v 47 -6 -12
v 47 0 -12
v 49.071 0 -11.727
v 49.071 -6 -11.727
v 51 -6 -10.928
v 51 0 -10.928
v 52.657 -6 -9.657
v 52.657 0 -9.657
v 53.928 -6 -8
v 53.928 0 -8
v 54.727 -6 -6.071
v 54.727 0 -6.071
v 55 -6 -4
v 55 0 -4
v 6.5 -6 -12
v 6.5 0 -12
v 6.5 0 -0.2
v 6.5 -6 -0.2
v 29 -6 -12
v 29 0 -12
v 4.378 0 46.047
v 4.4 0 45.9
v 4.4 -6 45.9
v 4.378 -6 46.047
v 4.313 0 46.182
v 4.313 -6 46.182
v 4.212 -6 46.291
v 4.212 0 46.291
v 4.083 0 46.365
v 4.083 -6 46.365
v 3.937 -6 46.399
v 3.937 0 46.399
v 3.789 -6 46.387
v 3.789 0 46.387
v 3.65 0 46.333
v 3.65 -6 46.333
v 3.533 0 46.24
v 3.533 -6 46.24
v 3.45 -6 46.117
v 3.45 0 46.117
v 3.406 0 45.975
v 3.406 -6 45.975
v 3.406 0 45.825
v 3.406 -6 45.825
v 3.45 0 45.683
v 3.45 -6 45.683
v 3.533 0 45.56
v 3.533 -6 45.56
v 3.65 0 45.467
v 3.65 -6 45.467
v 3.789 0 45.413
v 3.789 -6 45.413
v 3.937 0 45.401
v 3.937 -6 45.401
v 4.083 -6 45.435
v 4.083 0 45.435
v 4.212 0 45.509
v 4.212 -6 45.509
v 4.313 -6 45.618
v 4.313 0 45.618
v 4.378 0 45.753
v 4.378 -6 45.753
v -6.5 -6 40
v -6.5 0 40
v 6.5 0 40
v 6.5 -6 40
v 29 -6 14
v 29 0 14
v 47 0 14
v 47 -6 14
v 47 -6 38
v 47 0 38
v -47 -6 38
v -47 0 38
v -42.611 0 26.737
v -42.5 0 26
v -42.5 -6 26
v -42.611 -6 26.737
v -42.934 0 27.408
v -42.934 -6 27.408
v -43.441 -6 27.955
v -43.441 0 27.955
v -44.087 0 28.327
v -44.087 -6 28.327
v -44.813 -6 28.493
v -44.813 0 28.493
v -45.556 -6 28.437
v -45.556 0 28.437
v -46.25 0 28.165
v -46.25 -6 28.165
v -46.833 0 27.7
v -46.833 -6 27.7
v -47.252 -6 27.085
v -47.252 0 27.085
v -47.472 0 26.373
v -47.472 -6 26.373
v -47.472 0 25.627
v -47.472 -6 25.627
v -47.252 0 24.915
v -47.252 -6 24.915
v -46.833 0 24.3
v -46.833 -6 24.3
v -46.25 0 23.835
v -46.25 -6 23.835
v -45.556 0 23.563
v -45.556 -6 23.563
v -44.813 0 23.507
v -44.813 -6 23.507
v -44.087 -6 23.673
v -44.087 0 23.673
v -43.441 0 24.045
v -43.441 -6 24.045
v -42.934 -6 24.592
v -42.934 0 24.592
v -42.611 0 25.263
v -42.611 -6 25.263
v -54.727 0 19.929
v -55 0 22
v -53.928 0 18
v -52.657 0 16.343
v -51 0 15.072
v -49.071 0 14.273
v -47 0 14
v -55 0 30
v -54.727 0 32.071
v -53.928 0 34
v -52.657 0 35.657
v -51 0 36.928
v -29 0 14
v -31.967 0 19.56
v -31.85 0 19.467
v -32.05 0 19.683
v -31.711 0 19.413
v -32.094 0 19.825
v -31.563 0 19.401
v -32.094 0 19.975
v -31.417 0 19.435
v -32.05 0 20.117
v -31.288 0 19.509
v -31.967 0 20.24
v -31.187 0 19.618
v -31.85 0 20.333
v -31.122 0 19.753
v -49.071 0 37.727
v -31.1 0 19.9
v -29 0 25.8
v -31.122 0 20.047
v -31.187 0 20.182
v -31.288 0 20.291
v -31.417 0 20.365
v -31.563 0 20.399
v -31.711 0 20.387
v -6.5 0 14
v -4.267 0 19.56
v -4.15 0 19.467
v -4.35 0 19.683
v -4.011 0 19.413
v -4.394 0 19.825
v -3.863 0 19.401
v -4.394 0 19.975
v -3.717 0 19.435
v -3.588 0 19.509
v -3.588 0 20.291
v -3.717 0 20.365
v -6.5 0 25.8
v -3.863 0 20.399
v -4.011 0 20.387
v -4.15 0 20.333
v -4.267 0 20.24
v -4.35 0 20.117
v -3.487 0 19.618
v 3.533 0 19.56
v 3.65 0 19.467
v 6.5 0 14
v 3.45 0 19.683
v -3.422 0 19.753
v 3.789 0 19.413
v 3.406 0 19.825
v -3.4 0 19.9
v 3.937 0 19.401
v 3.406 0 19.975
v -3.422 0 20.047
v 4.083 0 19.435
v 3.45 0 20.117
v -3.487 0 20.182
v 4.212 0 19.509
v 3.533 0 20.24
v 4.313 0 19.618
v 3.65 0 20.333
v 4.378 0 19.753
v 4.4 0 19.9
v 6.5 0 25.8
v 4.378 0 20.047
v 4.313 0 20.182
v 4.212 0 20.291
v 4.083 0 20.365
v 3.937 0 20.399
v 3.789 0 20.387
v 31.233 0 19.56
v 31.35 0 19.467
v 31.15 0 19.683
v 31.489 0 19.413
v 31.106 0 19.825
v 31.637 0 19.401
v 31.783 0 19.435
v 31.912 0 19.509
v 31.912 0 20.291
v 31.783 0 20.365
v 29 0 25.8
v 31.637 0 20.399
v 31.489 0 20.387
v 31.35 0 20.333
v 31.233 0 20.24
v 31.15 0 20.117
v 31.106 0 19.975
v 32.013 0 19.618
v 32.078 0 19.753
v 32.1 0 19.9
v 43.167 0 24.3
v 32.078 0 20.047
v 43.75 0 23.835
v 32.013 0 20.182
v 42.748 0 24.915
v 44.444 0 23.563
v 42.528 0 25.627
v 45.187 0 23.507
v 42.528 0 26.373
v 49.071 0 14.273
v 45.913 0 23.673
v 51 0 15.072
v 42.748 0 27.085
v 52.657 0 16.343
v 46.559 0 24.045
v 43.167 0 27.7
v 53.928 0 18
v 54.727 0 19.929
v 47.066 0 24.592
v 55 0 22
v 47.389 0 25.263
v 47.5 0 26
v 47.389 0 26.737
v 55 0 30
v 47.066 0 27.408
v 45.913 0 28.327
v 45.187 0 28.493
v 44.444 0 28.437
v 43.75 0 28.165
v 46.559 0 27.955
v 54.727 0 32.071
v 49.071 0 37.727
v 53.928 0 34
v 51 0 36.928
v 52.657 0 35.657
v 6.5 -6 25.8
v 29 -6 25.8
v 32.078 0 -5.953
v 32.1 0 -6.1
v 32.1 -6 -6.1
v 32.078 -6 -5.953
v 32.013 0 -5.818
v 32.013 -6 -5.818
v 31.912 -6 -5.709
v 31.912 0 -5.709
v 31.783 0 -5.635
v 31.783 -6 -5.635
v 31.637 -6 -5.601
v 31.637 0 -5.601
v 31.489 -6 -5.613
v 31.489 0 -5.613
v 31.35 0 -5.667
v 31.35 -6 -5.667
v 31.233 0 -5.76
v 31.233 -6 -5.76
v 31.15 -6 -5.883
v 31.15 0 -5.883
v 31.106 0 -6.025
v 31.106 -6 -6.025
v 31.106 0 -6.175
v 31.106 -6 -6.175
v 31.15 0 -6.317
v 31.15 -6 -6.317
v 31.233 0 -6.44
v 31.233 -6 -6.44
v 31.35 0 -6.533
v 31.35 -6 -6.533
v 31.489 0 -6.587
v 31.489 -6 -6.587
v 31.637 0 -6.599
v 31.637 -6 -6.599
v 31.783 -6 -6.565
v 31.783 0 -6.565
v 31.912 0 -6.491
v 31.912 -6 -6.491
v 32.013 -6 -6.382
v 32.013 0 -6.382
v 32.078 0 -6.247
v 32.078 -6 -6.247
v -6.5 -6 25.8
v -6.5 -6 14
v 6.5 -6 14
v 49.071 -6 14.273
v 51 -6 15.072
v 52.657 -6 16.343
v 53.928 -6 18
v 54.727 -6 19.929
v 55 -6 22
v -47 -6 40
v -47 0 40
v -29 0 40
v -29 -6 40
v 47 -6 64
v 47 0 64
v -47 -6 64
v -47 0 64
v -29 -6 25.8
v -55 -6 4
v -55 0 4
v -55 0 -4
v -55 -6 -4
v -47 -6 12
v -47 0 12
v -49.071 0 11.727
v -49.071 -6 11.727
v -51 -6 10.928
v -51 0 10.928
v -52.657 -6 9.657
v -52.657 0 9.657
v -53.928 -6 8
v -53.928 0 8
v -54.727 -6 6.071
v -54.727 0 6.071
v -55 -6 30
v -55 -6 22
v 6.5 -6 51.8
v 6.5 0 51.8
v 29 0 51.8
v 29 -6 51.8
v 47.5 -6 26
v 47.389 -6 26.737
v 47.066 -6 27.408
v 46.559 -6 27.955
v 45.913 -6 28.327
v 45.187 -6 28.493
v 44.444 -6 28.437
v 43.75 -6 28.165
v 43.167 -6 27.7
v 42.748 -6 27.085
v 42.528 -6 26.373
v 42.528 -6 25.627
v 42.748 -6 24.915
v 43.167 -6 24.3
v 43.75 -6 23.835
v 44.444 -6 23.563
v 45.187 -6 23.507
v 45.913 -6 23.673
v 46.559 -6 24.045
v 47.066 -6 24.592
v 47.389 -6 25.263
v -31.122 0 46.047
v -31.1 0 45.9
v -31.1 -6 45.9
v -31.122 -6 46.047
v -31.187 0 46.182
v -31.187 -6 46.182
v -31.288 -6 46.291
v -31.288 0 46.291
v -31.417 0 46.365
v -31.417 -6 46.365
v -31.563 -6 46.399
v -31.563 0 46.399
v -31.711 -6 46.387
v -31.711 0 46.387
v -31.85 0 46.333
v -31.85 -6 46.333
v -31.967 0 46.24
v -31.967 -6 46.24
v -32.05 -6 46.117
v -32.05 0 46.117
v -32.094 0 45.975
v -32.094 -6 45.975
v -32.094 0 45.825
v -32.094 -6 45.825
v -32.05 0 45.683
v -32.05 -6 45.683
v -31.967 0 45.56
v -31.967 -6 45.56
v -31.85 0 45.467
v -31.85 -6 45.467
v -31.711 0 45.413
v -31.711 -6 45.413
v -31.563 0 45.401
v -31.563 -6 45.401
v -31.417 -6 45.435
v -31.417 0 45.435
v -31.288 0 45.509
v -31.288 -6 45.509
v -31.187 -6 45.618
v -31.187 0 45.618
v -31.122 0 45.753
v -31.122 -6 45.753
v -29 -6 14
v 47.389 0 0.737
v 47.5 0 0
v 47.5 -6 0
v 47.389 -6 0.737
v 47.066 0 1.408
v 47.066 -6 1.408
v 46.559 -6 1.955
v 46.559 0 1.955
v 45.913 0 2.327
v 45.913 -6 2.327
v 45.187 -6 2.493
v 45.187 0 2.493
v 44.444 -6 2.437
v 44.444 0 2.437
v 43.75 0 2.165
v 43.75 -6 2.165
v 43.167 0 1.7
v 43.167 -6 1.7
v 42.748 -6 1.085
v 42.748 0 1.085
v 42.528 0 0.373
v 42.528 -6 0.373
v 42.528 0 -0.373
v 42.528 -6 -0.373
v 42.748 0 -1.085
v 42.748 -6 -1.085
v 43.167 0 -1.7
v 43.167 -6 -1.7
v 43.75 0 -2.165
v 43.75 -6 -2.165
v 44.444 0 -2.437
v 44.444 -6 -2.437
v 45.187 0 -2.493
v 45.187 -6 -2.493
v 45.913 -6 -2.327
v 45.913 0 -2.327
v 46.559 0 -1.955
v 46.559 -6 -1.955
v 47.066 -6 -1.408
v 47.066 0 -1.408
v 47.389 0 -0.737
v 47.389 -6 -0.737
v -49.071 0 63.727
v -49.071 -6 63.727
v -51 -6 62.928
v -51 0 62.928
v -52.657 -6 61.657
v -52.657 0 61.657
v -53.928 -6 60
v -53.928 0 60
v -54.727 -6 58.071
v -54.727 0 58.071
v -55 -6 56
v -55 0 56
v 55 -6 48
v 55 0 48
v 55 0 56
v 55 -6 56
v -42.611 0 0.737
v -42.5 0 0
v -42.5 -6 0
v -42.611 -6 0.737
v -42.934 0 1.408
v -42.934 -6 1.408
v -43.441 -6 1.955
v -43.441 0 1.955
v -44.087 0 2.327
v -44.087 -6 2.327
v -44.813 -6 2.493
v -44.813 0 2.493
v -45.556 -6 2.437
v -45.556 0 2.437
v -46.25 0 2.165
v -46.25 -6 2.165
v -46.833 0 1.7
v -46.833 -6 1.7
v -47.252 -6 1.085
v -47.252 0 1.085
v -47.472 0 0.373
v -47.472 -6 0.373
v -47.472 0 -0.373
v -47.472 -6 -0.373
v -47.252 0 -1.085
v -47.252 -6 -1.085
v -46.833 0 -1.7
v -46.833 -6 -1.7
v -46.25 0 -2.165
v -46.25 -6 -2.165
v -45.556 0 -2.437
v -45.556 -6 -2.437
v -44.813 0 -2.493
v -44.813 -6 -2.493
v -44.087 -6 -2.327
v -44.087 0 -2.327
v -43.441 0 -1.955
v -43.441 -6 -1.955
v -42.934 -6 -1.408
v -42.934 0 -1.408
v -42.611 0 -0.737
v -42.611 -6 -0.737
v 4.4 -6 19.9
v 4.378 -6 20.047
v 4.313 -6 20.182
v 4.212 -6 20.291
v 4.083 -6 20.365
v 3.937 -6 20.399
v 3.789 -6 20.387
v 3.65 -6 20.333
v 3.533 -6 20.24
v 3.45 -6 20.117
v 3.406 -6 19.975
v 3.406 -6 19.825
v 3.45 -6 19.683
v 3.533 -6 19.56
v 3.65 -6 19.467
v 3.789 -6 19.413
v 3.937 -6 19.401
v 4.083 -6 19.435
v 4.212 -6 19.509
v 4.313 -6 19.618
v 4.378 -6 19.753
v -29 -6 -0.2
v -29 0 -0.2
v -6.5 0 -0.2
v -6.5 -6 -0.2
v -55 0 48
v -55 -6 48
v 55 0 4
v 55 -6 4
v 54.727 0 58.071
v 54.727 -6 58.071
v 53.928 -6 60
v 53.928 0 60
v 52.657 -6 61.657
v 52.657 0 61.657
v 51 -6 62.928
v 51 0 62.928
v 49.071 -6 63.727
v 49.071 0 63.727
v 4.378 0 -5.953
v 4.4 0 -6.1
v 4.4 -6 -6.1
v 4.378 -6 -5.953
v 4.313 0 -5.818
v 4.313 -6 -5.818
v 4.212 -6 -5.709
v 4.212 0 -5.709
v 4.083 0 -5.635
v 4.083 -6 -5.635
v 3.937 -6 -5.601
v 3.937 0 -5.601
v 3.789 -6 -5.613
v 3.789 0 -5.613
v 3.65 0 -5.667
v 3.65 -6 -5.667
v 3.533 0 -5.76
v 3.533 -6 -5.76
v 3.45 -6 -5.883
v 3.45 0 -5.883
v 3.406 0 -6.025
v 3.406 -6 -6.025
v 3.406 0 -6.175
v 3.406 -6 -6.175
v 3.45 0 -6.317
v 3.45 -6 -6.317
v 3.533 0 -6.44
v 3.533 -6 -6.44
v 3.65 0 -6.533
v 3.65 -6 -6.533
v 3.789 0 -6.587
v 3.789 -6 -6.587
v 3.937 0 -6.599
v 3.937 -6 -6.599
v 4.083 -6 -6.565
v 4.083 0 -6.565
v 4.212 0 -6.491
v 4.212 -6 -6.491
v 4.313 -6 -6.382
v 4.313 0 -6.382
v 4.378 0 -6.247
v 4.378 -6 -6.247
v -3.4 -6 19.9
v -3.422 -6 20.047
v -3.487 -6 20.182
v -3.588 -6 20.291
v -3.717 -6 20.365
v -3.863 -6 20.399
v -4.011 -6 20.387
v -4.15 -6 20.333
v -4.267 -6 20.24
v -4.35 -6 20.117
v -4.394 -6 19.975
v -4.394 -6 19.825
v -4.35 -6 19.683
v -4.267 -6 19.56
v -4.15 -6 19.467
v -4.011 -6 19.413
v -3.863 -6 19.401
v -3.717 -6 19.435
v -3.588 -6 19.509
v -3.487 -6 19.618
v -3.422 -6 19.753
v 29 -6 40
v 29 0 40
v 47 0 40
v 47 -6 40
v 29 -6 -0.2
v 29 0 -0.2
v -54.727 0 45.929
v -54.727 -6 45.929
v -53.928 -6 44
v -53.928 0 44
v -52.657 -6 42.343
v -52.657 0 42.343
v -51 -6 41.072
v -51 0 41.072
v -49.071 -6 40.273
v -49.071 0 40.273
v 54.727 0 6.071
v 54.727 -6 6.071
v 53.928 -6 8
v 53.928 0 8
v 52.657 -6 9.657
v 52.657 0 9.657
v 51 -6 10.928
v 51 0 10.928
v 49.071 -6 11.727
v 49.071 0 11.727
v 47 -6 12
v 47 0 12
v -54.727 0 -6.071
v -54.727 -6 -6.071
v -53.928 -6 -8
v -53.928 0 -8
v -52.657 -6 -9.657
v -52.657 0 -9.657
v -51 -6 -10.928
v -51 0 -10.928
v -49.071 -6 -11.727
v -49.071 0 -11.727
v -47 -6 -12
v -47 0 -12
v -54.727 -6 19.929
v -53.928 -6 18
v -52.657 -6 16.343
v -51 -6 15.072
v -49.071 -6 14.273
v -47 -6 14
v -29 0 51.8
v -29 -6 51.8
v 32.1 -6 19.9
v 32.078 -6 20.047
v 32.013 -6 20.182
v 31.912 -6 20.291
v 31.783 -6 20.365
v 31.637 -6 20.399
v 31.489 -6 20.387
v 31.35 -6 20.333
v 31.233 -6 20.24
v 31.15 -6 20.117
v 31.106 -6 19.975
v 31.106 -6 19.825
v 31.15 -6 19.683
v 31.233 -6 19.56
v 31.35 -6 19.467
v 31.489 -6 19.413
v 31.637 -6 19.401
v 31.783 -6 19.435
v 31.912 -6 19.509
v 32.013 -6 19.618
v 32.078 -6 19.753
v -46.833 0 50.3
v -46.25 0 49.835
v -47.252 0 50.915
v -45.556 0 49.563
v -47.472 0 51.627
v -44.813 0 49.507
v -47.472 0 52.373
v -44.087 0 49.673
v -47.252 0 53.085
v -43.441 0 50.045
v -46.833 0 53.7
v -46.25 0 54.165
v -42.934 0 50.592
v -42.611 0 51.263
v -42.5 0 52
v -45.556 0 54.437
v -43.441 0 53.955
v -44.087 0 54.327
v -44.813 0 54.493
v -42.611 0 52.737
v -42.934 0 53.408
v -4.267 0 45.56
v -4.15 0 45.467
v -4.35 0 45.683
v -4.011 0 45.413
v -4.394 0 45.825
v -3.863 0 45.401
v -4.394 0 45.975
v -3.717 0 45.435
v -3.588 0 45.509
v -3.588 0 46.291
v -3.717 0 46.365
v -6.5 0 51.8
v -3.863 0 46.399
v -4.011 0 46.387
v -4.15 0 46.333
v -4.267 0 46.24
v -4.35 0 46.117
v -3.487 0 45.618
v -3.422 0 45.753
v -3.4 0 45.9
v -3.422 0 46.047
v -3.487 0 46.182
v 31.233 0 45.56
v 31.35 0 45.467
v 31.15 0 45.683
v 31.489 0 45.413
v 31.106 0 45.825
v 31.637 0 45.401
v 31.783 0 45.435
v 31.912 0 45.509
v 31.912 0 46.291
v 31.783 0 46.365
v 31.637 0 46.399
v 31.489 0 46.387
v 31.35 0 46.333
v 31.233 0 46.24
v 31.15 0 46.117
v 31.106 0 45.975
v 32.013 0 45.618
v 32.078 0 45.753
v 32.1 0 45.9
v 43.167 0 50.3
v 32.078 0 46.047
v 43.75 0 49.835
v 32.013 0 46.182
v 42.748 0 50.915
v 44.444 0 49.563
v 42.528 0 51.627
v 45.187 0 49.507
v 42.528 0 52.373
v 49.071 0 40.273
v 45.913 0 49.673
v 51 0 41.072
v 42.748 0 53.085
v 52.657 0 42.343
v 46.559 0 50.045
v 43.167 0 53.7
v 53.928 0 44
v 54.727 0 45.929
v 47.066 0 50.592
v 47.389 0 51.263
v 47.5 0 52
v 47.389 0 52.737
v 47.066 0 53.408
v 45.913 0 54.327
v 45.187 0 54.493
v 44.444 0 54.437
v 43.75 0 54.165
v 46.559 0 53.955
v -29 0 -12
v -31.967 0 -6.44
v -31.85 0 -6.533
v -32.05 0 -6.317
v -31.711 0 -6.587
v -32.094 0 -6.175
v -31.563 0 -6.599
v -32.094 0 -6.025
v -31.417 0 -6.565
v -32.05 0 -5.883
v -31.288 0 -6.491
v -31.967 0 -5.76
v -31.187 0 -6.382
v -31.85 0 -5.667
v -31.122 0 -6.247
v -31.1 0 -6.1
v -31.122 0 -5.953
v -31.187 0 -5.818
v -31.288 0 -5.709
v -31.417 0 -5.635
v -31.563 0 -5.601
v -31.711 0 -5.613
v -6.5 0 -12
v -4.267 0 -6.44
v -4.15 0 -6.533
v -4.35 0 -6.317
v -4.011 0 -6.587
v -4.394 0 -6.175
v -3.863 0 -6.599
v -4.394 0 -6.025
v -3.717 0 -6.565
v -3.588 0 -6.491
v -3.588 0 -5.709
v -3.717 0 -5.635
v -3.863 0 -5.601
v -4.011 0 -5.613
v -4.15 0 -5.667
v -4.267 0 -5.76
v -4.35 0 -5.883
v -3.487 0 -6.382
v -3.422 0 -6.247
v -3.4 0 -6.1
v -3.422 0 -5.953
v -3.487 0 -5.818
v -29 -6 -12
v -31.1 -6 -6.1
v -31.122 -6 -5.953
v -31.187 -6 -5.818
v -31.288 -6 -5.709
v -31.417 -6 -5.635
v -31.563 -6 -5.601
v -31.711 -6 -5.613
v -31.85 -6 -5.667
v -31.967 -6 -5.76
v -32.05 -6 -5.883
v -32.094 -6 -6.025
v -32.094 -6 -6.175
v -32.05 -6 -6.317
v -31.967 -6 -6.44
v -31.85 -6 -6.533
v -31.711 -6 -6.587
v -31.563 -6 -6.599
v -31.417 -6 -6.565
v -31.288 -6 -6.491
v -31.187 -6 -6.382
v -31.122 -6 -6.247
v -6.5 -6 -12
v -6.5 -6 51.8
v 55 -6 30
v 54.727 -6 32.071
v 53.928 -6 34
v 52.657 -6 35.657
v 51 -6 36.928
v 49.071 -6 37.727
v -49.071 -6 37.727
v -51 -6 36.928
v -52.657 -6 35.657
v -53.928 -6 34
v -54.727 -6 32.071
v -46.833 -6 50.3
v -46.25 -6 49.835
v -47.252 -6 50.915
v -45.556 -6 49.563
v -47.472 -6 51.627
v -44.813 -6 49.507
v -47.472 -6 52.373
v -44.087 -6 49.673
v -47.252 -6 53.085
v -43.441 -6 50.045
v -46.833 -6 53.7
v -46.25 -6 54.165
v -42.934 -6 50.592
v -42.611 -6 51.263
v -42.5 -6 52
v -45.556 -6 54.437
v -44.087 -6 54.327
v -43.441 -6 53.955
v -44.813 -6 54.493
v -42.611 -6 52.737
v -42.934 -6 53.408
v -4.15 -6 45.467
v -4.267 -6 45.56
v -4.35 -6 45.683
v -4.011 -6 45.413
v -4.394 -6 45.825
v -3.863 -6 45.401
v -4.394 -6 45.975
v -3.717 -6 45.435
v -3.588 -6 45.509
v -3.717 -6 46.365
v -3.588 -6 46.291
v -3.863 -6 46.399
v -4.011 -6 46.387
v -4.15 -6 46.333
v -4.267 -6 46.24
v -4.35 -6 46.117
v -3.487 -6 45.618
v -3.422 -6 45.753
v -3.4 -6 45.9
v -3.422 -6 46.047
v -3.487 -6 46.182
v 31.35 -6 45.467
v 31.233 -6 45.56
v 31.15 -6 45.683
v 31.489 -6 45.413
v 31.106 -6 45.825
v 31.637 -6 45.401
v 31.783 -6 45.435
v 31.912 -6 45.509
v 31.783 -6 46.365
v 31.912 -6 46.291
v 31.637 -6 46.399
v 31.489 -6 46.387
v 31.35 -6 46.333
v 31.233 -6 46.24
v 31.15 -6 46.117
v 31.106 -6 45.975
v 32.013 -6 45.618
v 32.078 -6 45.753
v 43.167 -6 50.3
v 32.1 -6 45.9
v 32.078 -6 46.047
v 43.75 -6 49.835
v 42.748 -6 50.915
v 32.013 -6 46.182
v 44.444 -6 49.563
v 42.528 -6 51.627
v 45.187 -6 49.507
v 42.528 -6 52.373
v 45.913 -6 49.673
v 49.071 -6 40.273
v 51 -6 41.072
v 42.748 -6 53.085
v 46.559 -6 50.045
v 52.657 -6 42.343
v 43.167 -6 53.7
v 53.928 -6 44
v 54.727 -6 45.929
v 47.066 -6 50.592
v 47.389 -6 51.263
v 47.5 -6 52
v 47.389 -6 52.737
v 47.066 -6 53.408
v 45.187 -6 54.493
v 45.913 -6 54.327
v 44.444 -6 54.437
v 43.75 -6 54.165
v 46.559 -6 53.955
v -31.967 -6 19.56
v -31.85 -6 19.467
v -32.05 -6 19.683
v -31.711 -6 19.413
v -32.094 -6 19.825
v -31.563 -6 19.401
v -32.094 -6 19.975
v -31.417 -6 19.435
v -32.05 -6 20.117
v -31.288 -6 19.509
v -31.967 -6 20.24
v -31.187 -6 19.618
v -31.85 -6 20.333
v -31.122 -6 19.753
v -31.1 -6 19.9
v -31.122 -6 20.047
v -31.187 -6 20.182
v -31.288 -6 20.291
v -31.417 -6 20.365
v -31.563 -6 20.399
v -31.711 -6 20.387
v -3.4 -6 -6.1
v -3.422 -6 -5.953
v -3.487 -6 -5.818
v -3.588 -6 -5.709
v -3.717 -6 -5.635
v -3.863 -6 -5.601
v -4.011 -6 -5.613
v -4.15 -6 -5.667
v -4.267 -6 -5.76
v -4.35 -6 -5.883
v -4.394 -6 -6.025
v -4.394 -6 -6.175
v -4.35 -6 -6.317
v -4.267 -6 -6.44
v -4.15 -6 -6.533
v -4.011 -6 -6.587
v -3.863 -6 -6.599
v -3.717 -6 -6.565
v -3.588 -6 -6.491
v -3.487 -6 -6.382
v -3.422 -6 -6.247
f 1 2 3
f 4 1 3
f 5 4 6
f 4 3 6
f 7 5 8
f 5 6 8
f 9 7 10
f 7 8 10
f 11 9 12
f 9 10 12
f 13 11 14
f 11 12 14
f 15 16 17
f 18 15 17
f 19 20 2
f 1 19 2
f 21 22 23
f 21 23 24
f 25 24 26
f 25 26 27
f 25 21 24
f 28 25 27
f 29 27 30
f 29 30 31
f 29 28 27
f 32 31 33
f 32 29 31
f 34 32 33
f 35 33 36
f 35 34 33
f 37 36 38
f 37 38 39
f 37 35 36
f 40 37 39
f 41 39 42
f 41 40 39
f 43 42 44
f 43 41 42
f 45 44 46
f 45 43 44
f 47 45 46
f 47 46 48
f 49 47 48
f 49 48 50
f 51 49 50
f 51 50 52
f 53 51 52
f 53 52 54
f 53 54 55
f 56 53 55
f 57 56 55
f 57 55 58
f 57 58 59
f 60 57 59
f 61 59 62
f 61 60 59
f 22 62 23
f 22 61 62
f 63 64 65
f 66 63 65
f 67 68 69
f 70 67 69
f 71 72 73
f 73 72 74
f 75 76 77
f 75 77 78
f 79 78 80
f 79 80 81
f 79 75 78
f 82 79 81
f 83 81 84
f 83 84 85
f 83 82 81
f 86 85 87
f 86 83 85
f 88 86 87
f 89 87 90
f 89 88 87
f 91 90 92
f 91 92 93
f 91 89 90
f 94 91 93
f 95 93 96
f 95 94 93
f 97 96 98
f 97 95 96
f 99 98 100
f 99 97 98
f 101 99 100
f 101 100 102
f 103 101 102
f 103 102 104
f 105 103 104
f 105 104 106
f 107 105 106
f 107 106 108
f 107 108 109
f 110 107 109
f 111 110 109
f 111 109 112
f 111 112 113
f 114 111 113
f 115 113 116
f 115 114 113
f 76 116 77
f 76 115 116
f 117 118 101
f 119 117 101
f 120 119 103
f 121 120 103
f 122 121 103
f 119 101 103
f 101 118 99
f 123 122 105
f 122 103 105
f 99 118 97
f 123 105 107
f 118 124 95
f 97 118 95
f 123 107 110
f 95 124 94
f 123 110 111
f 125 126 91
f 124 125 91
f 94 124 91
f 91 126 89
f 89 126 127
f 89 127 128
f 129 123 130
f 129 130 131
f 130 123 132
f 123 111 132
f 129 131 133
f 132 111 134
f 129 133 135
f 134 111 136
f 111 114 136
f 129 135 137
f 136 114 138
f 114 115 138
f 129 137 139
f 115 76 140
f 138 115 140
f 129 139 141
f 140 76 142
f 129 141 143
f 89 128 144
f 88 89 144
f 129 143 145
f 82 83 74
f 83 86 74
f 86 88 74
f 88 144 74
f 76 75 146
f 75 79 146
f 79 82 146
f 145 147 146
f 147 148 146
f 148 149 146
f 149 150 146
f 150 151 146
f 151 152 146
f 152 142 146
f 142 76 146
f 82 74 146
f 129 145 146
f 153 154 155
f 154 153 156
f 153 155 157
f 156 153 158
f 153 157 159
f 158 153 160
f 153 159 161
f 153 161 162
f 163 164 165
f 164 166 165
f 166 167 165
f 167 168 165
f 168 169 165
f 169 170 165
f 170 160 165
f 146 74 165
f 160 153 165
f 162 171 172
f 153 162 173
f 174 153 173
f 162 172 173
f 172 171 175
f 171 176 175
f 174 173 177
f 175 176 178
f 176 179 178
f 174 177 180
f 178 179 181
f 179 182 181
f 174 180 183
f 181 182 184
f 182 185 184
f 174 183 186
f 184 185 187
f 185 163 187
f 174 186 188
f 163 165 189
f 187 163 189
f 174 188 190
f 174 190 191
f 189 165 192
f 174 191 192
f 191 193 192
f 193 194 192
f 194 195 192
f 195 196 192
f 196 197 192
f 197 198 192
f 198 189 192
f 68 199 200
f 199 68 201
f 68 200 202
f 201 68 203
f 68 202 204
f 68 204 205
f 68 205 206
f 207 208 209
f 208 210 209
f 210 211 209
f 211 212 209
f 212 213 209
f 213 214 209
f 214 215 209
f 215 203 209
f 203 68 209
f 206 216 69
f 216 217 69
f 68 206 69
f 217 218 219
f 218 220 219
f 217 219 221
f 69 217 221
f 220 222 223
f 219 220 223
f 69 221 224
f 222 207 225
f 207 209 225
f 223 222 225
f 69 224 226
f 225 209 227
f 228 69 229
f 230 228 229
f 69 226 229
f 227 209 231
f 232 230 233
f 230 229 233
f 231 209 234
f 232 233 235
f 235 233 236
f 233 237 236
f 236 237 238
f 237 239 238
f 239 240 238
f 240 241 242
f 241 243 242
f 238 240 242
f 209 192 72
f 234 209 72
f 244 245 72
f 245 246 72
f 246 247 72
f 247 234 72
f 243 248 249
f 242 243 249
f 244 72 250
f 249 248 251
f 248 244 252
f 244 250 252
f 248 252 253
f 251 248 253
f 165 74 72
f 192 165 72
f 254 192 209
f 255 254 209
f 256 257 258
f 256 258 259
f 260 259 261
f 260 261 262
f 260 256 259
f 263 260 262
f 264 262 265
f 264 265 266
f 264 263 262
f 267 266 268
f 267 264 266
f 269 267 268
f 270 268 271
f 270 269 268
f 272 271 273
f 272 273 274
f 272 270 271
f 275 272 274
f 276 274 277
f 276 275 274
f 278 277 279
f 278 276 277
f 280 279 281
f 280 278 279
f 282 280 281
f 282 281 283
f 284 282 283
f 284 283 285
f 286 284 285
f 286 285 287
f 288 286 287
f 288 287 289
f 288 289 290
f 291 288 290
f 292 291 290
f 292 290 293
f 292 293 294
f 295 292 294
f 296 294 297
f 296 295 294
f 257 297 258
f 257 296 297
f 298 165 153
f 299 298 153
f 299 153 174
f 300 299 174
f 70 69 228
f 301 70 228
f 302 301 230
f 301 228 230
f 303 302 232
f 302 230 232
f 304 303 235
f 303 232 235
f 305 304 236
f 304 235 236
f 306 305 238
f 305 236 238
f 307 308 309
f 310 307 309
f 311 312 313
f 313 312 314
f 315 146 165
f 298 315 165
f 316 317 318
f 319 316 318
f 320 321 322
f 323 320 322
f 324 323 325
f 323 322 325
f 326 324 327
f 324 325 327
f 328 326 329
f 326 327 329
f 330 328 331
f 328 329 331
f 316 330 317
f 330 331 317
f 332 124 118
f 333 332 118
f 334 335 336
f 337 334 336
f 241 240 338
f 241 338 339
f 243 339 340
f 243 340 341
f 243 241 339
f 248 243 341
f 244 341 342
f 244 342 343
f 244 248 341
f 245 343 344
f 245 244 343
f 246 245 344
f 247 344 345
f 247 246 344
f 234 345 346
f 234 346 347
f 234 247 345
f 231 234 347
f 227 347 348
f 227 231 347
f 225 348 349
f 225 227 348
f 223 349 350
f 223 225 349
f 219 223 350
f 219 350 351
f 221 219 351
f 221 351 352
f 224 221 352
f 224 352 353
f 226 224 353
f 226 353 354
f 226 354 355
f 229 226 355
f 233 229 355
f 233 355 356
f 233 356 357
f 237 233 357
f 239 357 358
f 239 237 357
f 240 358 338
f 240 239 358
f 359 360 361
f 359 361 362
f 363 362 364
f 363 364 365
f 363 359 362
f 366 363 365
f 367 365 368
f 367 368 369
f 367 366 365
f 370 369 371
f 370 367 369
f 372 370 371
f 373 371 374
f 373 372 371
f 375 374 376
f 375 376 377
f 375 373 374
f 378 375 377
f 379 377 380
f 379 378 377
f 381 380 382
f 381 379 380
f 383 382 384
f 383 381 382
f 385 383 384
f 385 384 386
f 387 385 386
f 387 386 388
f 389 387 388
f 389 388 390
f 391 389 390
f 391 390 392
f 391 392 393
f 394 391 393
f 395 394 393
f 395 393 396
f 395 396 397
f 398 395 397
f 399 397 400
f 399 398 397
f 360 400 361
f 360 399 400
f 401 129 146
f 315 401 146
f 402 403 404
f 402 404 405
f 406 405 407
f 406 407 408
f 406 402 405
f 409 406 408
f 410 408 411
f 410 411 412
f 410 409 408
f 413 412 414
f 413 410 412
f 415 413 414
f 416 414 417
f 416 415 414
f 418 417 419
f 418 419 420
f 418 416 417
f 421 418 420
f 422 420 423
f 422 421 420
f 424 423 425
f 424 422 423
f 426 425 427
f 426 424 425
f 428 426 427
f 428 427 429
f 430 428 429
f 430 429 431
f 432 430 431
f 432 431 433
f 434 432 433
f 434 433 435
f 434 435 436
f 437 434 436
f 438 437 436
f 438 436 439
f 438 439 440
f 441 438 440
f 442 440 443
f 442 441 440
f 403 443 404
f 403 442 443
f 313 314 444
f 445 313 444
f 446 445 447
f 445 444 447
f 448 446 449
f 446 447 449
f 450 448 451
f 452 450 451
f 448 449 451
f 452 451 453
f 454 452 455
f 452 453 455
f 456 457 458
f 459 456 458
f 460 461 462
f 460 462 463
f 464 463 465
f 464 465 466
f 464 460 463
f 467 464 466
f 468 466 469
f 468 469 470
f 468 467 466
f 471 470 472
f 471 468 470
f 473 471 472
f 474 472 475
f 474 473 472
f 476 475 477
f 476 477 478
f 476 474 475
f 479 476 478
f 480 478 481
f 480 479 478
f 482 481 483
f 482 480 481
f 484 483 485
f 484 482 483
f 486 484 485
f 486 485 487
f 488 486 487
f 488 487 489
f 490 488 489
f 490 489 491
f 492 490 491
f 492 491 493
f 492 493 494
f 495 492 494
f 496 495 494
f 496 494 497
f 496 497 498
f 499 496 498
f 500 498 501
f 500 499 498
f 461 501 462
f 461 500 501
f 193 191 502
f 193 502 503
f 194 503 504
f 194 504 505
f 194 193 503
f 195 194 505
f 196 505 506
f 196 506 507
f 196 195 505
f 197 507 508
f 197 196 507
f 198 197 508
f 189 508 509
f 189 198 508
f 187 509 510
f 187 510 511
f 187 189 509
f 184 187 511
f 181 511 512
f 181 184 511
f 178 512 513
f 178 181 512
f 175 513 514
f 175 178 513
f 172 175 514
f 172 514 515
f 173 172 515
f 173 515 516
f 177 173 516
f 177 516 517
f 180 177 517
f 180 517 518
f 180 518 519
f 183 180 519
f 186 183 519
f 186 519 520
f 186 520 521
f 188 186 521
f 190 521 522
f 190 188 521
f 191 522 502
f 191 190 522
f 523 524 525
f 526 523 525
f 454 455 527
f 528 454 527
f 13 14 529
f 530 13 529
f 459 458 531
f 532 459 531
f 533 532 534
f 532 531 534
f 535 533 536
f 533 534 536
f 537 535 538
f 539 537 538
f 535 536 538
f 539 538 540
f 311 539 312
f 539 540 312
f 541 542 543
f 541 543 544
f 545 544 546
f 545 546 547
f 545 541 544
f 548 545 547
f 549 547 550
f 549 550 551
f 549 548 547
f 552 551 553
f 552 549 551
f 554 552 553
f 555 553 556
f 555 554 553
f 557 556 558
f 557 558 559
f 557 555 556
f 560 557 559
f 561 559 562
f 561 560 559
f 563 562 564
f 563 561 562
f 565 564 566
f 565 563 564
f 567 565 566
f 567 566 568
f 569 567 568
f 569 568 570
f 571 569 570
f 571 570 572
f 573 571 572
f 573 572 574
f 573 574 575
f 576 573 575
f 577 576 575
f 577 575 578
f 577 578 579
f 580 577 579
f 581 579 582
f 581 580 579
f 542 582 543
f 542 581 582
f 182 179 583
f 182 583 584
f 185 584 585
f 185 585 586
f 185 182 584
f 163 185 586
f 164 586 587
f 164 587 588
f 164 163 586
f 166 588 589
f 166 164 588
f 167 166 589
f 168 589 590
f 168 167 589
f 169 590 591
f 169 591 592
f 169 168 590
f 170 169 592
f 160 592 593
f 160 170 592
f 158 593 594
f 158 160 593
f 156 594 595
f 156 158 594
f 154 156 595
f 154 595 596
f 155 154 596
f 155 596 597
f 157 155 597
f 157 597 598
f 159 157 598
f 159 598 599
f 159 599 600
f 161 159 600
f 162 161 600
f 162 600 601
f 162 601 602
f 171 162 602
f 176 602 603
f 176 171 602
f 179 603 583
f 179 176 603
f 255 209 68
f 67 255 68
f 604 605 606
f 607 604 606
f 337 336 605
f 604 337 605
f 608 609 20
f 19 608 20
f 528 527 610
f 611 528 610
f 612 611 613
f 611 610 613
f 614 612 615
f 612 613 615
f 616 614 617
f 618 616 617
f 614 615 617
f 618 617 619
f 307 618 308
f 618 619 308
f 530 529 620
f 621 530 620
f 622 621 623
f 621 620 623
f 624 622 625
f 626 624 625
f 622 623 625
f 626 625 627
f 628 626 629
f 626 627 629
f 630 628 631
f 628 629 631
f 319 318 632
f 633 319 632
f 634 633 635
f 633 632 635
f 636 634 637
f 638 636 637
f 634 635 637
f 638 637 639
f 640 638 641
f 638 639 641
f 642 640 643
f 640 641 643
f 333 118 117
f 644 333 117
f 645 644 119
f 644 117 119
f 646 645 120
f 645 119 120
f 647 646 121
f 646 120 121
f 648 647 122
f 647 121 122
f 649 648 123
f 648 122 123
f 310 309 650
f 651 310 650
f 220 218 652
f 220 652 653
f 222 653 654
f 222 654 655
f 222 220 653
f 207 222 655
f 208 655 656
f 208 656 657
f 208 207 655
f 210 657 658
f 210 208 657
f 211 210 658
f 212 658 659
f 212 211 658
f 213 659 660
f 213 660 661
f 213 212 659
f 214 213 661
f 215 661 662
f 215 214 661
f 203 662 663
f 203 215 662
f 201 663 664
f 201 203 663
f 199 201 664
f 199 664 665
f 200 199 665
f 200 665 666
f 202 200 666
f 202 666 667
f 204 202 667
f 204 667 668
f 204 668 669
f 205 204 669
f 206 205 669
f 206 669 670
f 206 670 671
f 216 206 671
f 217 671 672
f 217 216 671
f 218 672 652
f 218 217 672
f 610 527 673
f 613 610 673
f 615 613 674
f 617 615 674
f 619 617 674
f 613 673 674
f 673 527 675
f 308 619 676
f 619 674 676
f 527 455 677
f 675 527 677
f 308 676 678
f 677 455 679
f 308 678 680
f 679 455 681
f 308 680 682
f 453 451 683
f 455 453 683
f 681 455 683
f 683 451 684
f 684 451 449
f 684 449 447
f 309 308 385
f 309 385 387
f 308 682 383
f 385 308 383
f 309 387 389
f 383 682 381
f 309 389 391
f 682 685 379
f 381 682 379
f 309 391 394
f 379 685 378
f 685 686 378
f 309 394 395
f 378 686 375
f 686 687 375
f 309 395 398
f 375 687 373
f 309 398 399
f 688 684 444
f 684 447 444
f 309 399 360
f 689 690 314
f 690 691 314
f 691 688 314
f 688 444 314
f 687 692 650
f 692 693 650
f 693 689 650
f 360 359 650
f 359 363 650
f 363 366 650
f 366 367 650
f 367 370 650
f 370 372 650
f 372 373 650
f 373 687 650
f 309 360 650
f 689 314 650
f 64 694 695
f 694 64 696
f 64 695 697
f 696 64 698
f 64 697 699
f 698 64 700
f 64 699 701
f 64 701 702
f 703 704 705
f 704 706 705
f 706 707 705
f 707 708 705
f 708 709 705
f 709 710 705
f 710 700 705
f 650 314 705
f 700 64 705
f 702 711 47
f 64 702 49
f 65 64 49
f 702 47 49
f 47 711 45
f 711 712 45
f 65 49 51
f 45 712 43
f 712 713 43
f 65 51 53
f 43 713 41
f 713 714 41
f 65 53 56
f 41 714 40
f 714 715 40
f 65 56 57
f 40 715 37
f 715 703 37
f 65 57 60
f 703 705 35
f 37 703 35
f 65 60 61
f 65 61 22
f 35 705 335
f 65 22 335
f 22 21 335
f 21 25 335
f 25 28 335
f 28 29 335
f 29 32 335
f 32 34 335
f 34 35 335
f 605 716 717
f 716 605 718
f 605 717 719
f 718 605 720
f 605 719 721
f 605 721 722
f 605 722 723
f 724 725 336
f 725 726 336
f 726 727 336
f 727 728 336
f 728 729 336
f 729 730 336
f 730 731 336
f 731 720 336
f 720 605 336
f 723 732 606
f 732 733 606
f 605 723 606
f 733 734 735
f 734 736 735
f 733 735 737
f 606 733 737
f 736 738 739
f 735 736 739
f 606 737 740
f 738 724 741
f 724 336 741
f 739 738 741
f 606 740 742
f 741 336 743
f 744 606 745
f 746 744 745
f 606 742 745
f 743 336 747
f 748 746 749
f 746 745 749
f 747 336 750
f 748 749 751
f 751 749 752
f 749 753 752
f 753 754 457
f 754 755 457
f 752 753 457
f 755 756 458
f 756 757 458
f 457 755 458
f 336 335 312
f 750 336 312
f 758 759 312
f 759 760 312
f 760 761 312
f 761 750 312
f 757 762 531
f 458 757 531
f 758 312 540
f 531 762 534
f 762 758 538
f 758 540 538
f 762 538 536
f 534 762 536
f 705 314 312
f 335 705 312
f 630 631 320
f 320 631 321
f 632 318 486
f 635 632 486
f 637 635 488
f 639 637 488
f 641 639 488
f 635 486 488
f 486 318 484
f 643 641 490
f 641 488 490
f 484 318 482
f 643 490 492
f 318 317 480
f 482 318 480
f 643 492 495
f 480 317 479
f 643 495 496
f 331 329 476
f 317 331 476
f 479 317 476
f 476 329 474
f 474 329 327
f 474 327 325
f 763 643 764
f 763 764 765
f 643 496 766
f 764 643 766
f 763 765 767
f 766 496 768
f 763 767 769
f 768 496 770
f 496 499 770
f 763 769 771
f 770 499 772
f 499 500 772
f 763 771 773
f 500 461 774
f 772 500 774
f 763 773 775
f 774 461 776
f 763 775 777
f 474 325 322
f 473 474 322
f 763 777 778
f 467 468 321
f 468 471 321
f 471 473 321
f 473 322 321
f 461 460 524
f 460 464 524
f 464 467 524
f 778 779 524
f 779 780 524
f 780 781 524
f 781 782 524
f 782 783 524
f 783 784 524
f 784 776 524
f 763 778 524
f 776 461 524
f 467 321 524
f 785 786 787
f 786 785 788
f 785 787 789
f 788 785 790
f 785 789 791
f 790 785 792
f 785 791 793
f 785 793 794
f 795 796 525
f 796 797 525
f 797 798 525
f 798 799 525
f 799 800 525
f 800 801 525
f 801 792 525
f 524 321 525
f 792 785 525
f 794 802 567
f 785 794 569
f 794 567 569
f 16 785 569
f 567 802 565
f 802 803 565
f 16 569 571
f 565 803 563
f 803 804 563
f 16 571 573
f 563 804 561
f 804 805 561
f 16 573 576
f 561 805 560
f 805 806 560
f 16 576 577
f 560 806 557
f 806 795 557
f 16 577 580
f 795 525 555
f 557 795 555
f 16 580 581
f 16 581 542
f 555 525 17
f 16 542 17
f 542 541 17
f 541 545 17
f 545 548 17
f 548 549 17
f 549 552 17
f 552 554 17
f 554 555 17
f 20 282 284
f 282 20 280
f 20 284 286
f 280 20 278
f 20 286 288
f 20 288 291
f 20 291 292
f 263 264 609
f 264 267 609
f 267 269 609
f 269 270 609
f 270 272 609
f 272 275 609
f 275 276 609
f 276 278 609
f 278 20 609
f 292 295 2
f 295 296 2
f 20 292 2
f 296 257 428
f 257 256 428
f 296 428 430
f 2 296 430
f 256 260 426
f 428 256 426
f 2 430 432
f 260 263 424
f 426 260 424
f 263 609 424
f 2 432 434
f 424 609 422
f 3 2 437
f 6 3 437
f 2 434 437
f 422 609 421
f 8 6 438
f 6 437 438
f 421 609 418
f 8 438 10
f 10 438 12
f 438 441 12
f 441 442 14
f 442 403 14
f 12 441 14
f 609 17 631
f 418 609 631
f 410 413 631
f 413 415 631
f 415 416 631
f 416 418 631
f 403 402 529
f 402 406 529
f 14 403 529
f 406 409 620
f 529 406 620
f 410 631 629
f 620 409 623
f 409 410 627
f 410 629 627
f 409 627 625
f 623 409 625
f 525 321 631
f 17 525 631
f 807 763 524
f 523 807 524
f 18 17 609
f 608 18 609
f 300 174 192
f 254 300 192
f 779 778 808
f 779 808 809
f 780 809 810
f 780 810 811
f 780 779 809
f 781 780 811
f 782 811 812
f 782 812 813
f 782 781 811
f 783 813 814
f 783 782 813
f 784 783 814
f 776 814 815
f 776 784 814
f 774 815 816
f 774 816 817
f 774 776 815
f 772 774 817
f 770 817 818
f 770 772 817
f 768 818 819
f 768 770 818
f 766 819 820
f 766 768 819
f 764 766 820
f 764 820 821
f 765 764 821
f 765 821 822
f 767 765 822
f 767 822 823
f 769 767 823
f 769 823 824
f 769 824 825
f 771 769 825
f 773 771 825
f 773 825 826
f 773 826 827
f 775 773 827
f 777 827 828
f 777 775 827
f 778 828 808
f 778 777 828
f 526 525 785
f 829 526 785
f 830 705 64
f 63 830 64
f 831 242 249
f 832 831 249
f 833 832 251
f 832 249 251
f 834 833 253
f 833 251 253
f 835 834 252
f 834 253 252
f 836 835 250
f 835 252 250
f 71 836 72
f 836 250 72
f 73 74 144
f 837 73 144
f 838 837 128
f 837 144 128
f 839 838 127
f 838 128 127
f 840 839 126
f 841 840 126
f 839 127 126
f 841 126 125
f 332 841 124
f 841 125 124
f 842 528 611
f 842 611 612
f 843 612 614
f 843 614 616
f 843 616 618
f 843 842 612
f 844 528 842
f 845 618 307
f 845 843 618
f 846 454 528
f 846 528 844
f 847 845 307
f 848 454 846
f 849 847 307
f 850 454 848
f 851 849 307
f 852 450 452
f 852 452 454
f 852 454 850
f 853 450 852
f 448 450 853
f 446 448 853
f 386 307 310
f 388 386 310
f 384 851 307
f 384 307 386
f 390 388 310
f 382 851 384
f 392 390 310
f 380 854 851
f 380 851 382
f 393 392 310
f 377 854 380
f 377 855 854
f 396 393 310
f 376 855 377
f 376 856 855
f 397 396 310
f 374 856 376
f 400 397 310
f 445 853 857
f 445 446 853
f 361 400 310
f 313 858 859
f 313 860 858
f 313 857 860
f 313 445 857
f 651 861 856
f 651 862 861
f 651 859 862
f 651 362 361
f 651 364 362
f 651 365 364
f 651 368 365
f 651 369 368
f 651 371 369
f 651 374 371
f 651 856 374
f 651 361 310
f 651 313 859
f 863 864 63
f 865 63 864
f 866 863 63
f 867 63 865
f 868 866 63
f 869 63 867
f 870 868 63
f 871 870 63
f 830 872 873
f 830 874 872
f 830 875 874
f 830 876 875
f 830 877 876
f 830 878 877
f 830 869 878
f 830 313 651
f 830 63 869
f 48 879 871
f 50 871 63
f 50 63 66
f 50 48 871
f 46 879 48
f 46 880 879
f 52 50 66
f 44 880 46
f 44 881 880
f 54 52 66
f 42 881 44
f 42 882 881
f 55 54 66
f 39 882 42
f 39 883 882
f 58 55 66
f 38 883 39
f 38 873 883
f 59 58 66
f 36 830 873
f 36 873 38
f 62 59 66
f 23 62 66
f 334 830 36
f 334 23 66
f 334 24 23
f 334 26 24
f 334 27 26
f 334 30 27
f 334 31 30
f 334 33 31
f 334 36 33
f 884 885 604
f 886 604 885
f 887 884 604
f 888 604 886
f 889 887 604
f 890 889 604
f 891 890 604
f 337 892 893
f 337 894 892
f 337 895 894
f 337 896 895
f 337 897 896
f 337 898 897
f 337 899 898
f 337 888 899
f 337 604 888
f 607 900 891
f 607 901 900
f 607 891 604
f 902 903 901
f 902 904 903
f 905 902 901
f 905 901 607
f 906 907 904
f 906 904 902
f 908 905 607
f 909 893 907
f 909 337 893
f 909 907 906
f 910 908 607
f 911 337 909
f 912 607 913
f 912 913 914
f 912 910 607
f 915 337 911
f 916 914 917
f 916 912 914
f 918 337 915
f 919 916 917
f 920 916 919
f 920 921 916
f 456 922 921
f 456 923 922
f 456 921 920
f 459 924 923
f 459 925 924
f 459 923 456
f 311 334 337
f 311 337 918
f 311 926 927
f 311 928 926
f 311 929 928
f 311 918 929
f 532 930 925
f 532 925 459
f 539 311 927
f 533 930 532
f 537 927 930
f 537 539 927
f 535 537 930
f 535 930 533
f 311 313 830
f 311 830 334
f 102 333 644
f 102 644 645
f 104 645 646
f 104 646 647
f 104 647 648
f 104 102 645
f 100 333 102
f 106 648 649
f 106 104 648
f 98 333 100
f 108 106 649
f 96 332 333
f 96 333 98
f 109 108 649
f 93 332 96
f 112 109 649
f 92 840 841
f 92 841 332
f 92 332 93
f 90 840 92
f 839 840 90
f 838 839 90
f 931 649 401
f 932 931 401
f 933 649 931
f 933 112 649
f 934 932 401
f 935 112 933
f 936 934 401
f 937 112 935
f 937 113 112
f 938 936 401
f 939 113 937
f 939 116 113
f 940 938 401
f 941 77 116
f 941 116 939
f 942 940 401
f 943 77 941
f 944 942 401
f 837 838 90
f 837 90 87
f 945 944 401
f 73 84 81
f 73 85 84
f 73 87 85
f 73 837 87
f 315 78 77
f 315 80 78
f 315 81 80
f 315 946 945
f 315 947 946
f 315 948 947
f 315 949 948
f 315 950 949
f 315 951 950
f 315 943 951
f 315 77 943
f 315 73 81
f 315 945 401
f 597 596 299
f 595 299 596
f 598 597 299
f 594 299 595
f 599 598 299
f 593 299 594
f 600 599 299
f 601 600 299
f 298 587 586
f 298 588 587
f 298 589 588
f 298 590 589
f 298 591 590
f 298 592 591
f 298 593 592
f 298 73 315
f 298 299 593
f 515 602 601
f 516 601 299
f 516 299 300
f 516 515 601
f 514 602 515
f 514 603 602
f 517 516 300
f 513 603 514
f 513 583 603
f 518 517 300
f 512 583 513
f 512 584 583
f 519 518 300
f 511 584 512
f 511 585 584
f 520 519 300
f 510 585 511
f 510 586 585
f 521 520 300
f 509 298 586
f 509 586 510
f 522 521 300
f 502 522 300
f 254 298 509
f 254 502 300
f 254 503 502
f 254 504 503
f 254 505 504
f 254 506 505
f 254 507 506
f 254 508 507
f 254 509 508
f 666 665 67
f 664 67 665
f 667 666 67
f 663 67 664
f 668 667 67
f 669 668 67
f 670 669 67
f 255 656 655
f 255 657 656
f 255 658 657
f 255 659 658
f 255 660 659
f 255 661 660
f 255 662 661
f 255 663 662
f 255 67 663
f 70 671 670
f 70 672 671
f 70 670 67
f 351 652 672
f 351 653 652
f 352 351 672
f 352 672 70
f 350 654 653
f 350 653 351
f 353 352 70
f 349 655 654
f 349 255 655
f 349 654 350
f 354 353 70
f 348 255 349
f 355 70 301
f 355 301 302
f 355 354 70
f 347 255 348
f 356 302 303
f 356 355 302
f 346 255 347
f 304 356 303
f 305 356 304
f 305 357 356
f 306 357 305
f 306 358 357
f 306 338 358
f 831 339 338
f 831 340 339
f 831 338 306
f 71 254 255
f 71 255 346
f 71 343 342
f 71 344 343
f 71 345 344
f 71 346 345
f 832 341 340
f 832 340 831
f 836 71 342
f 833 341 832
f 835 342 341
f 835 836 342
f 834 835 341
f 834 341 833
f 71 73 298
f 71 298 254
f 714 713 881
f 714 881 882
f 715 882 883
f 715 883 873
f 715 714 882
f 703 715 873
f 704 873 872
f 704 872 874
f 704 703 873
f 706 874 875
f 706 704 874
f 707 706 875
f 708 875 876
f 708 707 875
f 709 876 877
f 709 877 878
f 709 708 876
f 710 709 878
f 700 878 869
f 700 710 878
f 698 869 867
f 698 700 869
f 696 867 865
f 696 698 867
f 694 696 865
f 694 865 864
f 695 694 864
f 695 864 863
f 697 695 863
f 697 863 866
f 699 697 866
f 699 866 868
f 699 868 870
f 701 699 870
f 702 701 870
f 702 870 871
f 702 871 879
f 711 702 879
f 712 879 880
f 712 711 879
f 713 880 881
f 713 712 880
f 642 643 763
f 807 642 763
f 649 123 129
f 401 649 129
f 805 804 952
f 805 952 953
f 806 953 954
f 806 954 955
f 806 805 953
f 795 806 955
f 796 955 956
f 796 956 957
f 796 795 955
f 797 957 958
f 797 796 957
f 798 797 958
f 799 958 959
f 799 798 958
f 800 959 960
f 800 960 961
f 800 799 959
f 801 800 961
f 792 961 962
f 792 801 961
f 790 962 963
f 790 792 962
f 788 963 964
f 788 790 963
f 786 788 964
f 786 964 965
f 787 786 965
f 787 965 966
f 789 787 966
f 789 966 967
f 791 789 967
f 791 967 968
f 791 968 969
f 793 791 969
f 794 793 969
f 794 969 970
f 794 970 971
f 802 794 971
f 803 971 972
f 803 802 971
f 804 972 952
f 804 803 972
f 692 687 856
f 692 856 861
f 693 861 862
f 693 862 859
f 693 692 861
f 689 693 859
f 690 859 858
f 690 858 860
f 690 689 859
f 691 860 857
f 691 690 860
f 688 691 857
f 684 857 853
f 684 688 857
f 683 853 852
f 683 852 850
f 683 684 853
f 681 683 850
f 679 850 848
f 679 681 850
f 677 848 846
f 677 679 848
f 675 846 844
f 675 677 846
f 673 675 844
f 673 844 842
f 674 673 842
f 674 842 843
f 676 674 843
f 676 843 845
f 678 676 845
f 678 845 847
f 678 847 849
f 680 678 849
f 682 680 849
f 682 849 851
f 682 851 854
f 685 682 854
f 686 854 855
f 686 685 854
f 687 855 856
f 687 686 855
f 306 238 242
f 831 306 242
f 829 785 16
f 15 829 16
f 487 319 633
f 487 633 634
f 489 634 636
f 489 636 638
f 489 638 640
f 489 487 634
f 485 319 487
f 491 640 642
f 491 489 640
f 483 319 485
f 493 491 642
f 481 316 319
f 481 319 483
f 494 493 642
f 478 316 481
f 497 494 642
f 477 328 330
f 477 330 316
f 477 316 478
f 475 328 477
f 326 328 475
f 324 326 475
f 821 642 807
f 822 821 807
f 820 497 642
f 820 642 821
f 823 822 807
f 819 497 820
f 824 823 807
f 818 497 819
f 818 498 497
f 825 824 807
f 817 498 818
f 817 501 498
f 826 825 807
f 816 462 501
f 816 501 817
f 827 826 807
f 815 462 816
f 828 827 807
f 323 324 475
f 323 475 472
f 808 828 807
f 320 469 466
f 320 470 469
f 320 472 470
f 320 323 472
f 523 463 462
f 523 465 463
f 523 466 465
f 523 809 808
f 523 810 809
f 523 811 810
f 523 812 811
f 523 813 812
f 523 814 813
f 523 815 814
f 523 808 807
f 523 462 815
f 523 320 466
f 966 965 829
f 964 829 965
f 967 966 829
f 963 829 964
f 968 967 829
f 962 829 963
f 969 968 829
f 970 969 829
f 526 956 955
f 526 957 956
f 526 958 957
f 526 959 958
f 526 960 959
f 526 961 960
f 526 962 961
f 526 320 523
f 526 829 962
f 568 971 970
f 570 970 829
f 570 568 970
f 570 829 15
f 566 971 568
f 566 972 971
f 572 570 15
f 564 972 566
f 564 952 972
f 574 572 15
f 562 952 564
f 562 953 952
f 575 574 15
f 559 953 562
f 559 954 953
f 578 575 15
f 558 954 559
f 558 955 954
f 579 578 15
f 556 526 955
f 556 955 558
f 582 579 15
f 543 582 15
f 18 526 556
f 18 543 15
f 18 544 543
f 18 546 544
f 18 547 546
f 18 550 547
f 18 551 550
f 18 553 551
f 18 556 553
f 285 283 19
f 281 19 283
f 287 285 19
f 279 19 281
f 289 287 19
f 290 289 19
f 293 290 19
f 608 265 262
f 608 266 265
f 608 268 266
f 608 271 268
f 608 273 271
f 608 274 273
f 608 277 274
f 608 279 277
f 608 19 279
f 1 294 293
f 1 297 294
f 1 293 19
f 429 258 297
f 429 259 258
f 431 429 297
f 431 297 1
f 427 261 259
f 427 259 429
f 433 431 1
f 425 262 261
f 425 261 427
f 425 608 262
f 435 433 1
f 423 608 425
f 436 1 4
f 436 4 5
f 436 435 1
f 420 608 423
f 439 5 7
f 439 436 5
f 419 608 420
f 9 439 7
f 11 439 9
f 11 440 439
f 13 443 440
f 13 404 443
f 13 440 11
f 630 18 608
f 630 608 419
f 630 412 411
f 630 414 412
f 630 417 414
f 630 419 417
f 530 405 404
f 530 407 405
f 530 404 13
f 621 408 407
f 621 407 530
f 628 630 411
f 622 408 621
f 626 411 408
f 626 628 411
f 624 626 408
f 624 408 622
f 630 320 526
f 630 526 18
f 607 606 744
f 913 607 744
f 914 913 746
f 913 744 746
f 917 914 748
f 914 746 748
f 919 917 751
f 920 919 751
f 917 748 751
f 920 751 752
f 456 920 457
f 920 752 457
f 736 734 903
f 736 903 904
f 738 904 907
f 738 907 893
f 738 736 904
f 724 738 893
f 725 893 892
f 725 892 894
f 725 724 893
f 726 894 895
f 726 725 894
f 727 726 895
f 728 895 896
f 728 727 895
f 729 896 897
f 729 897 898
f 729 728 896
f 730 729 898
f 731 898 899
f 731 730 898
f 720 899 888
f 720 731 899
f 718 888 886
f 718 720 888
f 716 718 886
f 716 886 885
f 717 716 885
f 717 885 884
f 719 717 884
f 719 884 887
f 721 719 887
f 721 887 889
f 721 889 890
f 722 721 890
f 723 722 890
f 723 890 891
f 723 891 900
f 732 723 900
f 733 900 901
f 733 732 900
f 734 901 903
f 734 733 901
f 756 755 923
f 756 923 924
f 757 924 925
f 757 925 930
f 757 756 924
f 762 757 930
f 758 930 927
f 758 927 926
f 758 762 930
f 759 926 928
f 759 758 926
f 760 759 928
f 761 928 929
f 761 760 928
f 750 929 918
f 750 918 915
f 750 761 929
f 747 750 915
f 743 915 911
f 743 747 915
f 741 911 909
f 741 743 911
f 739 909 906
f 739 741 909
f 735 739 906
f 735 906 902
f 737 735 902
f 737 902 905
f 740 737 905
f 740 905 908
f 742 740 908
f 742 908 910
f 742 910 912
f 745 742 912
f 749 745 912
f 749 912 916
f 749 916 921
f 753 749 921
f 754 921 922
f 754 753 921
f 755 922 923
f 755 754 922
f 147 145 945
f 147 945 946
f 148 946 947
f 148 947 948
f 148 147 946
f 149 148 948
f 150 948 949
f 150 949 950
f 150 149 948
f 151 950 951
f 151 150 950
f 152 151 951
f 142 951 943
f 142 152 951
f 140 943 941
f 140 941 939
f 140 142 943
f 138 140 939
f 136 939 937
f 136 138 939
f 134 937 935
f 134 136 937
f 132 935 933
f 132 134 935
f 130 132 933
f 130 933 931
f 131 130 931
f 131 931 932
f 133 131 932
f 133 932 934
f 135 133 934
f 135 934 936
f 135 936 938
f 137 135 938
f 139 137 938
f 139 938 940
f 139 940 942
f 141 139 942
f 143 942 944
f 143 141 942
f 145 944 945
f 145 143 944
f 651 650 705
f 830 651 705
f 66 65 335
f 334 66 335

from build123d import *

# Parameters (mm, degrees)
F0_R     = 0.5
F0_R_2   = 2.5
F1_DEPTH = 6


with BuildPart() as f1:
    # F0 (on Front) → F1 (new body)
    with BuildSketch(Plane.XZ):
        with BuildLine():
            Line((47, 12), (-47, 12))
            ThreePointArc((-47, 12), (-52.656854, 9.656854), (-55, 4))
            Line((-55, 4), (-55, -4))
            ThreePointArc((-55, -4), (-52.656854, -9.656854), (-47, -12))
            Line((-47, -12), (-29, -12))
            Line((-29, -12), (-29, -0.2))
            Line((-29, -0.2), (-6.5, -0.2))
            Line((-6.5, -0.2), (-6.5, -12))
            Line((-6.5, -12), (6.5, -12))
            Line((6.5, -12), (6.5, -0.2))
            Line((6.5, -0.2), (29, -0.2))
            Line((29, -0.2), (29, -12))
            Line((29, -12), (47, -12))
            ThreePointArc((47, -12), (52.656854, -9.656854), (55, -4))
            Line((55, -4), (55, 4))
            ThreePointArc((55, 4), (52.656854, 9.656854), (47, 12))
        make_face()
        with Locations((-31.6, -6.1)):
            Circle(F0_R, mode=Mode.SUBTRACT)
        with Locations((-45, 0)):
            Circle(F0_R_2, mode=Mode.SUBTRACT)
        with Locations((-3.9, -6.1)):
            Circle(F0_R, mode=Mode.SUBTRACT)
        with Locations((3.9, -6.1)):
            Circle(F0_R, mode=Mode.SUBTRACT)
        with Locations((31.6, -6.1)):
            Circle(F0_R, mode=Mode.SUBTRACT)
        with Locations((45, 0)):
            Circle(F0_R_2, mode=Mode.SUBTRACT)
        with BuildLine():
            Line((-47, 14), (-29, 14))
            Line((-29, 14), (-29, 25.8))
            Line((-29, 25.8), (-6.5, 25.8))
            Line((-6.5, 25.8), (-6.5, 14))
            Line((-6.5, 14), (6.5, 14))
            Line((6.5, 14), (6.5, 25.8))
            Line((6.5, 25.8), (29, 25.8))
            Line((29, 25.8), (29, 14))
            Line((29, 14), (47, 14))
            ThreePointArc((47, 14), (52.656854, 16.343146), (55, 22))
            Line((55, 22), (55, 30))
            ThreePointArc((55, 30), (52.656854, 35.656854), (47, 38))
            Line((47, 38), (-47, 38))
            ThreePointArc((-47, 38), (-52.656854, 35.656854), (-55, 30))
            Line((-55, 30), (-55, 22))
            ThreePointArc((-55, 22), (-52.656854, 16.343146), (-47, 14))
        make_face()
        with Locations((-31.6, 19.9)):
            Circle(F0_R, mode=Mode.SUBTRACT)
        with Locations((-3.9, 19.9)):
            Circle(F0_R, mode=Mode.SUBTRACT)
        with Locations((3.9, 19.9)):
            Circle(F0_R, mode=Mode.SUBTRACT)
        with Locations((31.6, 19.9)):
            Circle(F0_R, mode=Mode.SUBTRACT)
        with Locations((-45, 26)):
            Circle(F0_R_2, mode=Mode.SUBTRACT)
        with Locations((45, 26)):
            Circle(F0_R_2, mode=Mode.SUBTRACT)
        with BuildLine():
            Line((-47, 40), (-29, 40))
            Line((-29, 40), (-29, 51.8))
            Line((-29, 51.8), (-6.5, 51.8))
            Line((-6.5, 51.8), (-6.5, 40))
            Line((-6.5, 40), (6.5, 40))
            Line((6.5, 40), (6.5, 51.8))
            Line((6.5, 51.8), (29, 51.8))
            Line((29, 51.8), (29, 40))
            Line((29, 40), (47, 40))
            ThreePointArc((47, 40), (52.656854, 42.343146), (55, 48))
            Line((55, 48), (55, 56))
            ThreePointArc((55, 56), (52.656854, 61.656854), (47, 64))
            Line((47, 64), (-47, 64))
            ThreePointArc((-47, 64), (-52.656854, 61.656854), (-55, 56))
            Line((-55, 56), (-55, 48))
            ThreePointArc((-55, 48), (-52.656854, 42.343146), (-47, 40))
        make_face()
        with Locations((-45, 52)):
            Circle(F0_R_2, mode=Mode.SUBTRACT)
        with Locations((-31.6, 45.9)):
            Circle(F0_R, mode=Mode.SUBTRACT)
        with Locations((-3.9, 45.9)):
            Circle(F0_R, mode=Mode.SUBTRACT)
        with Locations((3.9, 45.9)):
            Circle(F0_R, mode=Mode.SUBTRACT)
        with Locations((31.6, 45.9)):
            Circle(F0_R, mode=Mode.SUBTRACT)
        with Locations((45, 52)):
            Circle(F0_R_2, mode=Mode.SUBTRACT)
    extrude(amount=F1_DEPTH)


solid = f1.part
